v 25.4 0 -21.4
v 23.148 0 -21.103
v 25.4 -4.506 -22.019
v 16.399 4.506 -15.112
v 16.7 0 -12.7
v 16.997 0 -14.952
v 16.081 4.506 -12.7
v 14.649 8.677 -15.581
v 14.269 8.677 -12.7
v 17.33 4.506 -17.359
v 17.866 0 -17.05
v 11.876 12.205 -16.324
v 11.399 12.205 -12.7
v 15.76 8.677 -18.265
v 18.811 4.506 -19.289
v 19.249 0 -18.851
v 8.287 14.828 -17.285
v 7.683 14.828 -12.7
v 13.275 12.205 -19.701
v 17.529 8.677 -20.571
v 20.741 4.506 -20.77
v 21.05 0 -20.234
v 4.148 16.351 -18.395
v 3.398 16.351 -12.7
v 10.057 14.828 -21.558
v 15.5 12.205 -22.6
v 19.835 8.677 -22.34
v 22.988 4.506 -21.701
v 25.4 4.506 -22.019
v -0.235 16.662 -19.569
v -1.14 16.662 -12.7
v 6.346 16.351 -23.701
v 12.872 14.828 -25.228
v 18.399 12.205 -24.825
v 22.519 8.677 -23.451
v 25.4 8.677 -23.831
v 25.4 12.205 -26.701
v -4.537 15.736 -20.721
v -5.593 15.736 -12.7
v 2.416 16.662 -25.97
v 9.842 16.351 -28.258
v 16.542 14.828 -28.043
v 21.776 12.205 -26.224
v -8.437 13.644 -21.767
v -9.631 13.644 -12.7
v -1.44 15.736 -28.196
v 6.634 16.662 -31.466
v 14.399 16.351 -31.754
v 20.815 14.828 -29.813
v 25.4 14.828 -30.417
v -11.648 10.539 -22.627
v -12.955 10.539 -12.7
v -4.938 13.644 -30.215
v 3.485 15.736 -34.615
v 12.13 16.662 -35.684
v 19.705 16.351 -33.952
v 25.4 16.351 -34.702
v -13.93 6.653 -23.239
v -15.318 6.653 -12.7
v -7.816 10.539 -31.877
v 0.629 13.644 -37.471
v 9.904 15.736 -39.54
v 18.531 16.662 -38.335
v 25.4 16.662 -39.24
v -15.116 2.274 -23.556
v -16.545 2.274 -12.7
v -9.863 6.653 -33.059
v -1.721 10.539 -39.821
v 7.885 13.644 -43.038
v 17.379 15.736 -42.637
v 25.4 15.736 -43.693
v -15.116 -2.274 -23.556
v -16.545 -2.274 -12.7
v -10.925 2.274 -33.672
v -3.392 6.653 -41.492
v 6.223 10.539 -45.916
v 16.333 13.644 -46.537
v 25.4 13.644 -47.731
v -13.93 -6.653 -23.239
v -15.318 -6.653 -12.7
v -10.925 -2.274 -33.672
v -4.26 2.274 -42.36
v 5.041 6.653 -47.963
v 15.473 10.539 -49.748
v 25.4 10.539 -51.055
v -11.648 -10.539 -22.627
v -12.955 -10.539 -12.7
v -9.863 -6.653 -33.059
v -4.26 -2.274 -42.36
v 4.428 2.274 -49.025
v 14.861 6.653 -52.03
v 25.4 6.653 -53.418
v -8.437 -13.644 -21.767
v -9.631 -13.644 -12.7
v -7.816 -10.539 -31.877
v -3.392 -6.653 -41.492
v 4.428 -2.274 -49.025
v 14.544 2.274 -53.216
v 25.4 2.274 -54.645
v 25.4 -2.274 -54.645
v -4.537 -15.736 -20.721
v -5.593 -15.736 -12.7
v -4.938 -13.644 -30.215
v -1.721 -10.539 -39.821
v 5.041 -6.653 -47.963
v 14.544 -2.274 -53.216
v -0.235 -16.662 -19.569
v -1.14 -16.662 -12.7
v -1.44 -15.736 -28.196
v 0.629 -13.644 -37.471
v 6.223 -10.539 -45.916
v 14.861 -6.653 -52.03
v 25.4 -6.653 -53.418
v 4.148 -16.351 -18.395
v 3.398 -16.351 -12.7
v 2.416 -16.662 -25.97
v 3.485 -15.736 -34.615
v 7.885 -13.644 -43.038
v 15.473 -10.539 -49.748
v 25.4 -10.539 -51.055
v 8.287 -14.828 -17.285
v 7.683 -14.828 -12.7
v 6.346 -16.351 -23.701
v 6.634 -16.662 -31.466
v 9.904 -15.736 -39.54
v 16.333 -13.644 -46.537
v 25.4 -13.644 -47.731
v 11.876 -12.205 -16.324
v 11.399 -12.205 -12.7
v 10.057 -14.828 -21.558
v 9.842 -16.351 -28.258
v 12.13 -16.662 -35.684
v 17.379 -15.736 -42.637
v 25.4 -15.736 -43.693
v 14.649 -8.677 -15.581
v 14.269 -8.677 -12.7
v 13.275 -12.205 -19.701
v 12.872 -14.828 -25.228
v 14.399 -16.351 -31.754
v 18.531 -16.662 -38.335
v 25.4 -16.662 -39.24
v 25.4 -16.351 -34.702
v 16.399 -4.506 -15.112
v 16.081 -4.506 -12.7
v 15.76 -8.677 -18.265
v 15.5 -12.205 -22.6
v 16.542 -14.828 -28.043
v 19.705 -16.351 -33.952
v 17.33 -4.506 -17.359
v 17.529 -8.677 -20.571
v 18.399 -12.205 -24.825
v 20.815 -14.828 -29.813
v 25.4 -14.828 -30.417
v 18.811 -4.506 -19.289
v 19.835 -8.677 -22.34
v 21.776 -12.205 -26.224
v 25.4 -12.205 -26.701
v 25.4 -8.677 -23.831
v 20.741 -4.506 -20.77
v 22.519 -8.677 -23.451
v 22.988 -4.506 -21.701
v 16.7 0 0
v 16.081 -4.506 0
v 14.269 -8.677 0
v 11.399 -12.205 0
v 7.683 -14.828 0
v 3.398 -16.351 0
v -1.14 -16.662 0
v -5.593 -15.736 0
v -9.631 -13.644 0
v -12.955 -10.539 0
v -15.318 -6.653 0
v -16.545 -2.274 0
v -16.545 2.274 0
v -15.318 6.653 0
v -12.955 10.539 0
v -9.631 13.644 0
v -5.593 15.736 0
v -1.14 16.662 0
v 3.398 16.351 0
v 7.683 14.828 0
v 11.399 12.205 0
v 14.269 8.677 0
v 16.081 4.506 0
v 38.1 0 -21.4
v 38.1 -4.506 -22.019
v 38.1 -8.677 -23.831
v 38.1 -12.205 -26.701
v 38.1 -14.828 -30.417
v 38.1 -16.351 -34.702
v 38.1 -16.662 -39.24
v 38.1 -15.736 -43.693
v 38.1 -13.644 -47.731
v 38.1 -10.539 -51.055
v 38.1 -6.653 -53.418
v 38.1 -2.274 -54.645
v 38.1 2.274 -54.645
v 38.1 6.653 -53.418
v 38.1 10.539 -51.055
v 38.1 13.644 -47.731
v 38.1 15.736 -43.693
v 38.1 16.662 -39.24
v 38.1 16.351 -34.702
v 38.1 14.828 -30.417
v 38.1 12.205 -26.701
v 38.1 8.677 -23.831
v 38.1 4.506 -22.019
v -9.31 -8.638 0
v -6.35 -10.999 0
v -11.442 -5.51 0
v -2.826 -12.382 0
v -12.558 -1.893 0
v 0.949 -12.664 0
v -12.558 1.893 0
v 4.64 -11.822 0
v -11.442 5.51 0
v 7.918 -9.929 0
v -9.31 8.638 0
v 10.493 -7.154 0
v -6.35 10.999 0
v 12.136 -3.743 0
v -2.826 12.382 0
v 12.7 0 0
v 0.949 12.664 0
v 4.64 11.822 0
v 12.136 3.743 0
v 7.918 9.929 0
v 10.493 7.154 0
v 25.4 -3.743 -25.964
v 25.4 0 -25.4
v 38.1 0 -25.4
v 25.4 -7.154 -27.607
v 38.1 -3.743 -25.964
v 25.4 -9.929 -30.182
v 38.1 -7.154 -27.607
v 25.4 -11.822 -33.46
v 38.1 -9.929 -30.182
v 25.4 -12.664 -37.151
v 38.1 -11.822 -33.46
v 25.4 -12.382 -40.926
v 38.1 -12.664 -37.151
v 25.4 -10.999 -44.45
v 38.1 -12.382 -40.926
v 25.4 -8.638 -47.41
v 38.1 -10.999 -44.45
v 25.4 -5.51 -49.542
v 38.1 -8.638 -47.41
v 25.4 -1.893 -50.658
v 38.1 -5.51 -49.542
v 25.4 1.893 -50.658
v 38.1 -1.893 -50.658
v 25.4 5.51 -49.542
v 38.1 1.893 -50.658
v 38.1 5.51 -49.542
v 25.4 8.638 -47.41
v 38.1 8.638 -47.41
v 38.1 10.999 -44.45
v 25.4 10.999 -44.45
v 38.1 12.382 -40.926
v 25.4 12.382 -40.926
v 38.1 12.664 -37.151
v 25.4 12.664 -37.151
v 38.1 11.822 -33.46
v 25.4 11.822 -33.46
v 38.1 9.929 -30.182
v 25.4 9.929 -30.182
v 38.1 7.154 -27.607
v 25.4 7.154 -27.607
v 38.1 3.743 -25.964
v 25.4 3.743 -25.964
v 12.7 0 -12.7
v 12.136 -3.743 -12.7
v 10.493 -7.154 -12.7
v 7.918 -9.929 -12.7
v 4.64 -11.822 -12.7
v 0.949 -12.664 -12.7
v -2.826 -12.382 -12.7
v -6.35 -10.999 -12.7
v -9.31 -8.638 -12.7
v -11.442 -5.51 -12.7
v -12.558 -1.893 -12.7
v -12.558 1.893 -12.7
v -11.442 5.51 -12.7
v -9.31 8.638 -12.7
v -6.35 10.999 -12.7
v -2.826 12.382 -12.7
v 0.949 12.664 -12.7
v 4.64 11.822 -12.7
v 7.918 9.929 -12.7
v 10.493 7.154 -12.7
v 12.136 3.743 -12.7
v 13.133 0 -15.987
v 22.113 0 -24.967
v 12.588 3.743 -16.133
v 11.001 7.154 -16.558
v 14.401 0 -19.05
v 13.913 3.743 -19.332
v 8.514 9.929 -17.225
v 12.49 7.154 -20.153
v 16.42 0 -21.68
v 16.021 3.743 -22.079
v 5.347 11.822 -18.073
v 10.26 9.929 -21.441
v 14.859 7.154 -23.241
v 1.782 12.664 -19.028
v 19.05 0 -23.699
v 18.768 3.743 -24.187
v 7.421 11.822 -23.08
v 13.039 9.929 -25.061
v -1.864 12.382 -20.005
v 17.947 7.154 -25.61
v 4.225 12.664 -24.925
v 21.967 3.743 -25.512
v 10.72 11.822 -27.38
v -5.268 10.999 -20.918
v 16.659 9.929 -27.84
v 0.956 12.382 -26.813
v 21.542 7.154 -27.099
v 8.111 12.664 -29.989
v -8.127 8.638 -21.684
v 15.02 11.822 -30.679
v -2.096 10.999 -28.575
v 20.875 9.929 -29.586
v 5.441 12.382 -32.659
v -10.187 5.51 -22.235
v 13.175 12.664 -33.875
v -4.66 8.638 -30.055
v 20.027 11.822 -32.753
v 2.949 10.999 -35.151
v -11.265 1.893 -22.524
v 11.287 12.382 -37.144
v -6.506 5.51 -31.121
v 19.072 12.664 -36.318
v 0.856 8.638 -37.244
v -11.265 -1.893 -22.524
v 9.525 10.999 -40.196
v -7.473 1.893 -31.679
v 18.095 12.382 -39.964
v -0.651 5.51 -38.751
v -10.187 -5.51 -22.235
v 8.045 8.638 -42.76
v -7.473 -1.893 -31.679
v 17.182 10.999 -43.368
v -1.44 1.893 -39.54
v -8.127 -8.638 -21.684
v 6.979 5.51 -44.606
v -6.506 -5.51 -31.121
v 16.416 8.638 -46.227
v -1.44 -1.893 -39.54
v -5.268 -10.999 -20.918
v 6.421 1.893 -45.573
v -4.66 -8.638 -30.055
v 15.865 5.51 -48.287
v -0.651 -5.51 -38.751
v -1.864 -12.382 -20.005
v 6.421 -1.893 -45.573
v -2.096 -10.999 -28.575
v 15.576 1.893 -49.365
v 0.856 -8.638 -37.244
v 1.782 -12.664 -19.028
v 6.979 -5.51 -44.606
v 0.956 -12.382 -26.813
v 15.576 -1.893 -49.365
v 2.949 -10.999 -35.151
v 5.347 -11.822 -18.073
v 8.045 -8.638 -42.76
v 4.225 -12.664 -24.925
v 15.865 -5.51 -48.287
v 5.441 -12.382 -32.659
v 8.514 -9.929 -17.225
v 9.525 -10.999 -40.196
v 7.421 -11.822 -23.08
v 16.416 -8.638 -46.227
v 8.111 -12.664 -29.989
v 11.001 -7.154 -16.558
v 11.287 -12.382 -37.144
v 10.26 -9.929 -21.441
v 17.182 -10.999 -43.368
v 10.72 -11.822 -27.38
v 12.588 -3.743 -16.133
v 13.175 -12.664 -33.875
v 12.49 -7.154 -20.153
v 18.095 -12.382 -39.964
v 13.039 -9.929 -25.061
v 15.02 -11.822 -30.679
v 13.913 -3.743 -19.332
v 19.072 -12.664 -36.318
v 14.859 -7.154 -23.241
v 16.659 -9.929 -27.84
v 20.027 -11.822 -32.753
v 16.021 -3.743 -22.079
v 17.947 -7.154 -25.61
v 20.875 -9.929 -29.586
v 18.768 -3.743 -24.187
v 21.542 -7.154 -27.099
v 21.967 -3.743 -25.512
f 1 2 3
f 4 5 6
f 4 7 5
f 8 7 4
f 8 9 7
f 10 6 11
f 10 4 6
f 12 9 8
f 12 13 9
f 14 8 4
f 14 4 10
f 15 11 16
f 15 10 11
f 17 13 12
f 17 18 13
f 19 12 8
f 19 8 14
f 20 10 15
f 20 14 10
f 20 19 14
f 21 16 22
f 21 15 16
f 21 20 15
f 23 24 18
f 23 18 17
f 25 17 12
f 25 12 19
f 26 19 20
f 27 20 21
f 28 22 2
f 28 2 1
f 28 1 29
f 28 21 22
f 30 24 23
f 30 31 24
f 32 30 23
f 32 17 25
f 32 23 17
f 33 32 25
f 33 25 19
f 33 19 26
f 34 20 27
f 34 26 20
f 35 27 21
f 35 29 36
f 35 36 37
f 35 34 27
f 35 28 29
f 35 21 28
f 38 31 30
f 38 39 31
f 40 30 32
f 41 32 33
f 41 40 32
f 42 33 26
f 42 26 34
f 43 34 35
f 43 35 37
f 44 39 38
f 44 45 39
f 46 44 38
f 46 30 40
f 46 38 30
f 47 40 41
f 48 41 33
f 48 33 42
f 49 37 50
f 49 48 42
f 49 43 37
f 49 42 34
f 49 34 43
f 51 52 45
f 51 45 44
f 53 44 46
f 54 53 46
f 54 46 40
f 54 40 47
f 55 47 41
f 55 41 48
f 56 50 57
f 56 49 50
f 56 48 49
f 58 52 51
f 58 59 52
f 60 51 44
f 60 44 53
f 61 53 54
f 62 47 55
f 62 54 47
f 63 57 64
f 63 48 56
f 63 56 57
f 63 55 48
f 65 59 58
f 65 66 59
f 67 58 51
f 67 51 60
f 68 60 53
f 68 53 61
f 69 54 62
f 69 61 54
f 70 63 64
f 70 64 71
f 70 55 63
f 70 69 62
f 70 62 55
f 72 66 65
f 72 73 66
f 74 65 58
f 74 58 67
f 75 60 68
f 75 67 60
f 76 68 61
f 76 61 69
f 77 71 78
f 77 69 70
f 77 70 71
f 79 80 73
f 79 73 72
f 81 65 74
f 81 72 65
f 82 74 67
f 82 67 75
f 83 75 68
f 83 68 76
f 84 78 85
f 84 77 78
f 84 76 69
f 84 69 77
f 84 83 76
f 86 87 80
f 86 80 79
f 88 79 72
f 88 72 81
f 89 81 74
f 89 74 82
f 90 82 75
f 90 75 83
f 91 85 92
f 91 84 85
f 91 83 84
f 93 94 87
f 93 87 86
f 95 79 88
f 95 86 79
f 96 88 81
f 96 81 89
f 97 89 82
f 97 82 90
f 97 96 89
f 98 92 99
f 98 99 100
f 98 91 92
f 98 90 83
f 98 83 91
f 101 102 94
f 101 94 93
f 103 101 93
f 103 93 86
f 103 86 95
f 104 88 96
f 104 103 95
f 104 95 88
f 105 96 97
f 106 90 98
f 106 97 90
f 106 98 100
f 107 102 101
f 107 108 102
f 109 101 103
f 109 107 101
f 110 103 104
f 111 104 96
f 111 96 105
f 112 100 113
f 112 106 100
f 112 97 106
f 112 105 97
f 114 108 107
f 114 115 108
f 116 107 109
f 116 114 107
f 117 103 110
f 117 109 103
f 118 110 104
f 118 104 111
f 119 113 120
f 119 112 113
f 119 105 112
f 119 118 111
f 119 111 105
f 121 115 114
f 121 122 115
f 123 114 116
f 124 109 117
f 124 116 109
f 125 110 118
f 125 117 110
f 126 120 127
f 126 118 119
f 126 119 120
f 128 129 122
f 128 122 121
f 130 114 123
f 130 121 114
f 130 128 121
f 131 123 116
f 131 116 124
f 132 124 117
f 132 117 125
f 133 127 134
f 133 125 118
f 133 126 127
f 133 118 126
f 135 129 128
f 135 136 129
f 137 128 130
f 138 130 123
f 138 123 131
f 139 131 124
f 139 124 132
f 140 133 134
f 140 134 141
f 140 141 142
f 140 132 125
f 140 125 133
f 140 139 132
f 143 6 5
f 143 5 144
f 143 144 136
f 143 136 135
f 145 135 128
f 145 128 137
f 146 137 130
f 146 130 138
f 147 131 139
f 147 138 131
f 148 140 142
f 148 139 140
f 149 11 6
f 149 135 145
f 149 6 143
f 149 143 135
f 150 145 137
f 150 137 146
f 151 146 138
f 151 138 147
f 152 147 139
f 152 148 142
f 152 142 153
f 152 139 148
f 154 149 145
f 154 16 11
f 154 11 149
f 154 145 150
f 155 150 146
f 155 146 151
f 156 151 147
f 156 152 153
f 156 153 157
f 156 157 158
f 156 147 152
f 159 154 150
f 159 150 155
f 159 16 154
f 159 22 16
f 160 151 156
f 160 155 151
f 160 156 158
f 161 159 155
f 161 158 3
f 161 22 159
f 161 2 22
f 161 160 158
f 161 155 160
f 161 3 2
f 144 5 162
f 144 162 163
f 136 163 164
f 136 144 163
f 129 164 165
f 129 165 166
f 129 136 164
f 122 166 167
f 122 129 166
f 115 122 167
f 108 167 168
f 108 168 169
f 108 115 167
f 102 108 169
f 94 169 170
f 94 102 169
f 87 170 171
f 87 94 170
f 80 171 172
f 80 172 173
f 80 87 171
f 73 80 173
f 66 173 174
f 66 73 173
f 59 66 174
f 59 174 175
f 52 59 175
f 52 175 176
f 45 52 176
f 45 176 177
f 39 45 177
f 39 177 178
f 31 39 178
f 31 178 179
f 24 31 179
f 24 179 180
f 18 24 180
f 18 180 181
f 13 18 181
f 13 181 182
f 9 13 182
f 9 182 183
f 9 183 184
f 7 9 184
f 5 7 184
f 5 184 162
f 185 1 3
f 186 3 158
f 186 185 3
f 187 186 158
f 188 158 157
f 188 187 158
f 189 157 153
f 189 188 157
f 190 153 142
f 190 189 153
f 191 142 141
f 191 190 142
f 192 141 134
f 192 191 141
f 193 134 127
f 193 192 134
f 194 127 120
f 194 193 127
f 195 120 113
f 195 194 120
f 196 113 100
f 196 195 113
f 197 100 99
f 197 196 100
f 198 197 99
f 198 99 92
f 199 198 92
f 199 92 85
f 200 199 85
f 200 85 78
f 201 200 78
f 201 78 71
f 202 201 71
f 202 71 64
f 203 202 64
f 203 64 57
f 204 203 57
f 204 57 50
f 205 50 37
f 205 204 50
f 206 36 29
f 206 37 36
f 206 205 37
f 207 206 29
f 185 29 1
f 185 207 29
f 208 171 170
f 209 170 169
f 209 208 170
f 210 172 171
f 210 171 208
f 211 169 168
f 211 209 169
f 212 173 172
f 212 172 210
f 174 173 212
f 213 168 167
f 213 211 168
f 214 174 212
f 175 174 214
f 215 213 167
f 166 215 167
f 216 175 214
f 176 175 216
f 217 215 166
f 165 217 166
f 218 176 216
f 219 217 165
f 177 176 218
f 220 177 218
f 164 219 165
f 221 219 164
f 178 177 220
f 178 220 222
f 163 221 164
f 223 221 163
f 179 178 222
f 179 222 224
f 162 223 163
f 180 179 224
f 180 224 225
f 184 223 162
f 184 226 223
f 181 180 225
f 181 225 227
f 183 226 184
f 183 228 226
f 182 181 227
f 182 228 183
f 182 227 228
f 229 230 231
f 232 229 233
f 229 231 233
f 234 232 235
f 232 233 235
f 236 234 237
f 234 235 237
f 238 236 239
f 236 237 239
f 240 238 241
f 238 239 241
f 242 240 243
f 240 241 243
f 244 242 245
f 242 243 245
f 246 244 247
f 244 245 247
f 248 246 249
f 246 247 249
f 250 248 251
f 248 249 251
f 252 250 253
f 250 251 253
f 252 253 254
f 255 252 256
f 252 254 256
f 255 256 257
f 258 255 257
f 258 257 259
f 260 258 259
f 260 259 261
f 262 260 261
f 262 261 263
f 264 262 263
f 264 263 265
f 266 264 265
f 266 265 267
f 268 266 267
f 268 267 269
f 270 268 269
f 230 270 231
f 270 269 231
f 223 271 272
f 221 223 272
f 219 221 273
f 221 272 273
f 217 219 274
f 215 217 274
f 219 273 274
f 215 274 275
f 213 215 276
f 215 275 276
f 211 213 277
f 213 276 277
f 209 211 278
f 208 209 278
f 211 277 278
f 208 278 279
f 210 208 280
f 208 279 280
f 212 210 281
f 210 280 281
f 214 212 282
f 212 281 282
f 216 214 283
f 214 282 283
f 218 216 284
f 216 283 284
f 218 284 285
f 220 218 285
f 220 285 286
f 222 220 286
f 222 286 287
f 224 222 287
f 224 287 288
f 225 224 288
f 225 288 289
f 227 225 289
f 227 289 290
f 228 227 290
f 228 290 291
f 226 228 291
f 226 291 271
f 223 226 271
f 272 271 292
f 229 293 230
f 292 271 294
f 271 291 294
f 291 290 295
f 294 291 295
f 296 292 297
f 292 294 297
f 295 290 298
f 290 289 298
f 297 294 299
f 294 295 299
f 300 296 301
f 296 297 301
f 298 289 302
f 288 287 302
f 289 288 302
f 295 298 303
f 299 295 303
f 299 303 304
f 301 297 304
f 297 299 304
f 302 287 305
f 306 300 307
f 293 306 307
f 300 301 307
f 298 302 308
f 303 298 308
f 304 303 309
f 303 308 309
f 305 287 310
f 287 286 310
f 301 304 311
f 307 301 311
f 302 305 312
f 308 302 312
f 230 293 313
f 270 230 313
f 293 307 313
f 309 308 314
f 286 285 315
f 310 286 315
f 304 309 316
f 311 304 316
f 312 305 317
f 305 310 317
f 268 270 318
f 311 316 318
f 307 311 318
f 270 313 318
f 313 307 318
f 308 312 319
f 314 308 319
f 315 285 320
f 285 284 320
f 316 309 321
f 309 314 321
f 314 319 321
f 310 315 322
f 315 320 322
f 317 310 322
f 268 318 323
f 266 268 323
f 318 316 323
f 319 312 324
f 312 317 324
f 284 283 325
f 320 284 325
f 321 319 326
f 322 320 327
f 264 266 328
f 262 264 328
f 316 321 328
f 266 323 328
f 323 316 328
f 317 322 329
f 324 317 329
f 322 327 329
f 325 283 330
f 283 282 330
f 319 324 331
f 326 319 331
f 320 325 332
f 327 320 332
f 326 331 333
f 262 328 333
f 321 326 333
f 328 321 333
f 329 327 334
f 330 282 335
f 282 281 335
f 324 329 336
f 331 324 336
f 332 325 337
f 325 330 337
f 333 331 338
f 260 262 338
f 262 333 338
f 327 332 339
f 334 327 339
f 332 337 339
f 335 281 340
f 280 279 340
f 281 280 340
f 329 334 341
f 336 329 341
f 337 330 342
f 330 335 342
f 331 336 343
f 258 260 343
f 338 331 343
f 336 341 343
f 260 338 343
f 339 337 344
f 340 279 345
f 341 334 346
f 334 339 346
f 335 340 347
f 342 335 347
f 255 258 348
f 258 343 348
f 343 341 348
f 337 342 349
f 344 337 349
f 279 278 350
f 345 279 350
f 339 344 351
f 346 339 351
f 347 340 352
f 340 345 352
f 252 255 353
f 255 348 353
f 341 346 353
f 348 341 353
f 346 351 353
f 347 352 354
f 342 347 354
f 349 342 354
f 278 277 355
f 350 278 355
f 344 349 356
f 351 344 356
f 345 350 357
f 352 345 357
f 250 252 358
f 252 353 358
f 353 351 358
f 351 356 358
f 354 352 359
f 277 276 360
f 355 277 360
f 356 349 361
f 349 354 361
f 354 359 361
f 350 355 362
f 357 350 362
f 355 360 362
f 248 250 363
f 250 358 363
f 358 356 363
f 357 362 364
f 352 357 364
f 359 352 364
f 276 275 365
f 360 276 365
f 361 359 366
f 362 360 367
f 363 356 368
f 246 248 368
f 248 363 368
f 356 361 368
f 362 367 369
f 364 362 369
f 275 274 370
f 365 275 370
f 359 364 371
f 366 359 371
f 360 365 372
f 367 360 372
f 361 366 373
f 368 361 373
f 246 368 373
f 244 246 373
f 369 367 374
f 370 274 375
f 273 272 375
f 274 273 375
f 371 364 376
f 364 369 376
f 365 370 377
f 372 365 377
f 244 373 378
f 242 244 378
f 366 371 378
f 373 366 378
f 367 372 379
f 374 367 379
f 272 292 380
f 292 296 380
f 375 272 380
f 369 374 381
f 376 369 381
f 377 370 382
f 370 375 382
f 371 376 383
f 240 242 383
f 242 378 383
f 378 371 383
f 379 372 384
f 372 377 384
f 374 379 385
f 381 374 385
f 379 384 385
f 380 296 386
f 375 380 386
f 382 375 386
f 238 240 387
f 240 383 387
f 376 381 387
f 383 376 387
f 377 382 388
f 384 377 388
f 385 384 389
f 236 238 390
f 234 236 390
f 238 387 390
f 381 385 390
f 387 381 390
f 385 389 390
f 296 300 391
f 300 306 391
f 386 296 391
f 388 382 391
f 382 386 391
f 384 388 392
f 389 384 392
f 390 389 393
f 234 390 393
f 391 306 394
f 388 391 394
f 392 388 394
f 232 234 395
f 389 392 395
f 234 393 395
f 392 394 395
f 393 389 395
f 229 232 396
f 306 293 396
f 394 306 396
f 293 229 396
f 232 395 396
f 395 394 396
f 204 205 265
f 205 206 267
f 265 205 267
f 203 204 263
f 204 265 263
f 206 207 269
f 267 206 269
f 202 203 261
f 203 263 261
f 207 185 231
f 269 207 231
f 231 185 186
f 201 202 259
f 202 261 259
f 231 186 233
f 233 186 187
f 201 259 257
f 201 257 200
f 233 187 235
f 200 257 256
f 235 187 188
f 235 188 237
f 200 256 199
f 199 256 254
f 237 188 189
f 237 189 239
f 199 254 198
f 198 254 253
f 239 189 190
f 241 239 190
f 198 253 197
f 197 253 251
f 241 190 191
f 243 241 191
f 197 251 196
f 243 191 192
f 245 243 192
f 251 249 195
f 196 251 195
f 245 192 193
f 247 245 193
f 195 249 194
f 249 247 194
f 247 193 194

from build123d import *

# Parameters (mm, degrees)
SKETCH1_R   = 16.7005
SKETCH1_R_2 = 12.7


with BuildPart() as part:
    # Sweep1: sweep along a path in Sketch2
    with BuildLine(Plane(origin=(0, 0, 0), x_dir=(1, 0, 0), z_dir=(0, 1, 0))) as sweep1_path:
        Line((0, 0), (0, 12.7))
        ThreePointArc((0, 12.7), (7.439487758, 30.660512242), (25.4, 38.1))
        Line((25.4, 38.1), (38.1, 38.1))
    # Sketch1 → Sweep1 (sweep)
    with BuildSketch(Plane.XY):
        Circle(SKETCH1_R)
        Circle(SKETCH1_R_2, mode=Mode.SUBTRACT)
    sweep(path=sweep1_path.line)


solid = part.part
